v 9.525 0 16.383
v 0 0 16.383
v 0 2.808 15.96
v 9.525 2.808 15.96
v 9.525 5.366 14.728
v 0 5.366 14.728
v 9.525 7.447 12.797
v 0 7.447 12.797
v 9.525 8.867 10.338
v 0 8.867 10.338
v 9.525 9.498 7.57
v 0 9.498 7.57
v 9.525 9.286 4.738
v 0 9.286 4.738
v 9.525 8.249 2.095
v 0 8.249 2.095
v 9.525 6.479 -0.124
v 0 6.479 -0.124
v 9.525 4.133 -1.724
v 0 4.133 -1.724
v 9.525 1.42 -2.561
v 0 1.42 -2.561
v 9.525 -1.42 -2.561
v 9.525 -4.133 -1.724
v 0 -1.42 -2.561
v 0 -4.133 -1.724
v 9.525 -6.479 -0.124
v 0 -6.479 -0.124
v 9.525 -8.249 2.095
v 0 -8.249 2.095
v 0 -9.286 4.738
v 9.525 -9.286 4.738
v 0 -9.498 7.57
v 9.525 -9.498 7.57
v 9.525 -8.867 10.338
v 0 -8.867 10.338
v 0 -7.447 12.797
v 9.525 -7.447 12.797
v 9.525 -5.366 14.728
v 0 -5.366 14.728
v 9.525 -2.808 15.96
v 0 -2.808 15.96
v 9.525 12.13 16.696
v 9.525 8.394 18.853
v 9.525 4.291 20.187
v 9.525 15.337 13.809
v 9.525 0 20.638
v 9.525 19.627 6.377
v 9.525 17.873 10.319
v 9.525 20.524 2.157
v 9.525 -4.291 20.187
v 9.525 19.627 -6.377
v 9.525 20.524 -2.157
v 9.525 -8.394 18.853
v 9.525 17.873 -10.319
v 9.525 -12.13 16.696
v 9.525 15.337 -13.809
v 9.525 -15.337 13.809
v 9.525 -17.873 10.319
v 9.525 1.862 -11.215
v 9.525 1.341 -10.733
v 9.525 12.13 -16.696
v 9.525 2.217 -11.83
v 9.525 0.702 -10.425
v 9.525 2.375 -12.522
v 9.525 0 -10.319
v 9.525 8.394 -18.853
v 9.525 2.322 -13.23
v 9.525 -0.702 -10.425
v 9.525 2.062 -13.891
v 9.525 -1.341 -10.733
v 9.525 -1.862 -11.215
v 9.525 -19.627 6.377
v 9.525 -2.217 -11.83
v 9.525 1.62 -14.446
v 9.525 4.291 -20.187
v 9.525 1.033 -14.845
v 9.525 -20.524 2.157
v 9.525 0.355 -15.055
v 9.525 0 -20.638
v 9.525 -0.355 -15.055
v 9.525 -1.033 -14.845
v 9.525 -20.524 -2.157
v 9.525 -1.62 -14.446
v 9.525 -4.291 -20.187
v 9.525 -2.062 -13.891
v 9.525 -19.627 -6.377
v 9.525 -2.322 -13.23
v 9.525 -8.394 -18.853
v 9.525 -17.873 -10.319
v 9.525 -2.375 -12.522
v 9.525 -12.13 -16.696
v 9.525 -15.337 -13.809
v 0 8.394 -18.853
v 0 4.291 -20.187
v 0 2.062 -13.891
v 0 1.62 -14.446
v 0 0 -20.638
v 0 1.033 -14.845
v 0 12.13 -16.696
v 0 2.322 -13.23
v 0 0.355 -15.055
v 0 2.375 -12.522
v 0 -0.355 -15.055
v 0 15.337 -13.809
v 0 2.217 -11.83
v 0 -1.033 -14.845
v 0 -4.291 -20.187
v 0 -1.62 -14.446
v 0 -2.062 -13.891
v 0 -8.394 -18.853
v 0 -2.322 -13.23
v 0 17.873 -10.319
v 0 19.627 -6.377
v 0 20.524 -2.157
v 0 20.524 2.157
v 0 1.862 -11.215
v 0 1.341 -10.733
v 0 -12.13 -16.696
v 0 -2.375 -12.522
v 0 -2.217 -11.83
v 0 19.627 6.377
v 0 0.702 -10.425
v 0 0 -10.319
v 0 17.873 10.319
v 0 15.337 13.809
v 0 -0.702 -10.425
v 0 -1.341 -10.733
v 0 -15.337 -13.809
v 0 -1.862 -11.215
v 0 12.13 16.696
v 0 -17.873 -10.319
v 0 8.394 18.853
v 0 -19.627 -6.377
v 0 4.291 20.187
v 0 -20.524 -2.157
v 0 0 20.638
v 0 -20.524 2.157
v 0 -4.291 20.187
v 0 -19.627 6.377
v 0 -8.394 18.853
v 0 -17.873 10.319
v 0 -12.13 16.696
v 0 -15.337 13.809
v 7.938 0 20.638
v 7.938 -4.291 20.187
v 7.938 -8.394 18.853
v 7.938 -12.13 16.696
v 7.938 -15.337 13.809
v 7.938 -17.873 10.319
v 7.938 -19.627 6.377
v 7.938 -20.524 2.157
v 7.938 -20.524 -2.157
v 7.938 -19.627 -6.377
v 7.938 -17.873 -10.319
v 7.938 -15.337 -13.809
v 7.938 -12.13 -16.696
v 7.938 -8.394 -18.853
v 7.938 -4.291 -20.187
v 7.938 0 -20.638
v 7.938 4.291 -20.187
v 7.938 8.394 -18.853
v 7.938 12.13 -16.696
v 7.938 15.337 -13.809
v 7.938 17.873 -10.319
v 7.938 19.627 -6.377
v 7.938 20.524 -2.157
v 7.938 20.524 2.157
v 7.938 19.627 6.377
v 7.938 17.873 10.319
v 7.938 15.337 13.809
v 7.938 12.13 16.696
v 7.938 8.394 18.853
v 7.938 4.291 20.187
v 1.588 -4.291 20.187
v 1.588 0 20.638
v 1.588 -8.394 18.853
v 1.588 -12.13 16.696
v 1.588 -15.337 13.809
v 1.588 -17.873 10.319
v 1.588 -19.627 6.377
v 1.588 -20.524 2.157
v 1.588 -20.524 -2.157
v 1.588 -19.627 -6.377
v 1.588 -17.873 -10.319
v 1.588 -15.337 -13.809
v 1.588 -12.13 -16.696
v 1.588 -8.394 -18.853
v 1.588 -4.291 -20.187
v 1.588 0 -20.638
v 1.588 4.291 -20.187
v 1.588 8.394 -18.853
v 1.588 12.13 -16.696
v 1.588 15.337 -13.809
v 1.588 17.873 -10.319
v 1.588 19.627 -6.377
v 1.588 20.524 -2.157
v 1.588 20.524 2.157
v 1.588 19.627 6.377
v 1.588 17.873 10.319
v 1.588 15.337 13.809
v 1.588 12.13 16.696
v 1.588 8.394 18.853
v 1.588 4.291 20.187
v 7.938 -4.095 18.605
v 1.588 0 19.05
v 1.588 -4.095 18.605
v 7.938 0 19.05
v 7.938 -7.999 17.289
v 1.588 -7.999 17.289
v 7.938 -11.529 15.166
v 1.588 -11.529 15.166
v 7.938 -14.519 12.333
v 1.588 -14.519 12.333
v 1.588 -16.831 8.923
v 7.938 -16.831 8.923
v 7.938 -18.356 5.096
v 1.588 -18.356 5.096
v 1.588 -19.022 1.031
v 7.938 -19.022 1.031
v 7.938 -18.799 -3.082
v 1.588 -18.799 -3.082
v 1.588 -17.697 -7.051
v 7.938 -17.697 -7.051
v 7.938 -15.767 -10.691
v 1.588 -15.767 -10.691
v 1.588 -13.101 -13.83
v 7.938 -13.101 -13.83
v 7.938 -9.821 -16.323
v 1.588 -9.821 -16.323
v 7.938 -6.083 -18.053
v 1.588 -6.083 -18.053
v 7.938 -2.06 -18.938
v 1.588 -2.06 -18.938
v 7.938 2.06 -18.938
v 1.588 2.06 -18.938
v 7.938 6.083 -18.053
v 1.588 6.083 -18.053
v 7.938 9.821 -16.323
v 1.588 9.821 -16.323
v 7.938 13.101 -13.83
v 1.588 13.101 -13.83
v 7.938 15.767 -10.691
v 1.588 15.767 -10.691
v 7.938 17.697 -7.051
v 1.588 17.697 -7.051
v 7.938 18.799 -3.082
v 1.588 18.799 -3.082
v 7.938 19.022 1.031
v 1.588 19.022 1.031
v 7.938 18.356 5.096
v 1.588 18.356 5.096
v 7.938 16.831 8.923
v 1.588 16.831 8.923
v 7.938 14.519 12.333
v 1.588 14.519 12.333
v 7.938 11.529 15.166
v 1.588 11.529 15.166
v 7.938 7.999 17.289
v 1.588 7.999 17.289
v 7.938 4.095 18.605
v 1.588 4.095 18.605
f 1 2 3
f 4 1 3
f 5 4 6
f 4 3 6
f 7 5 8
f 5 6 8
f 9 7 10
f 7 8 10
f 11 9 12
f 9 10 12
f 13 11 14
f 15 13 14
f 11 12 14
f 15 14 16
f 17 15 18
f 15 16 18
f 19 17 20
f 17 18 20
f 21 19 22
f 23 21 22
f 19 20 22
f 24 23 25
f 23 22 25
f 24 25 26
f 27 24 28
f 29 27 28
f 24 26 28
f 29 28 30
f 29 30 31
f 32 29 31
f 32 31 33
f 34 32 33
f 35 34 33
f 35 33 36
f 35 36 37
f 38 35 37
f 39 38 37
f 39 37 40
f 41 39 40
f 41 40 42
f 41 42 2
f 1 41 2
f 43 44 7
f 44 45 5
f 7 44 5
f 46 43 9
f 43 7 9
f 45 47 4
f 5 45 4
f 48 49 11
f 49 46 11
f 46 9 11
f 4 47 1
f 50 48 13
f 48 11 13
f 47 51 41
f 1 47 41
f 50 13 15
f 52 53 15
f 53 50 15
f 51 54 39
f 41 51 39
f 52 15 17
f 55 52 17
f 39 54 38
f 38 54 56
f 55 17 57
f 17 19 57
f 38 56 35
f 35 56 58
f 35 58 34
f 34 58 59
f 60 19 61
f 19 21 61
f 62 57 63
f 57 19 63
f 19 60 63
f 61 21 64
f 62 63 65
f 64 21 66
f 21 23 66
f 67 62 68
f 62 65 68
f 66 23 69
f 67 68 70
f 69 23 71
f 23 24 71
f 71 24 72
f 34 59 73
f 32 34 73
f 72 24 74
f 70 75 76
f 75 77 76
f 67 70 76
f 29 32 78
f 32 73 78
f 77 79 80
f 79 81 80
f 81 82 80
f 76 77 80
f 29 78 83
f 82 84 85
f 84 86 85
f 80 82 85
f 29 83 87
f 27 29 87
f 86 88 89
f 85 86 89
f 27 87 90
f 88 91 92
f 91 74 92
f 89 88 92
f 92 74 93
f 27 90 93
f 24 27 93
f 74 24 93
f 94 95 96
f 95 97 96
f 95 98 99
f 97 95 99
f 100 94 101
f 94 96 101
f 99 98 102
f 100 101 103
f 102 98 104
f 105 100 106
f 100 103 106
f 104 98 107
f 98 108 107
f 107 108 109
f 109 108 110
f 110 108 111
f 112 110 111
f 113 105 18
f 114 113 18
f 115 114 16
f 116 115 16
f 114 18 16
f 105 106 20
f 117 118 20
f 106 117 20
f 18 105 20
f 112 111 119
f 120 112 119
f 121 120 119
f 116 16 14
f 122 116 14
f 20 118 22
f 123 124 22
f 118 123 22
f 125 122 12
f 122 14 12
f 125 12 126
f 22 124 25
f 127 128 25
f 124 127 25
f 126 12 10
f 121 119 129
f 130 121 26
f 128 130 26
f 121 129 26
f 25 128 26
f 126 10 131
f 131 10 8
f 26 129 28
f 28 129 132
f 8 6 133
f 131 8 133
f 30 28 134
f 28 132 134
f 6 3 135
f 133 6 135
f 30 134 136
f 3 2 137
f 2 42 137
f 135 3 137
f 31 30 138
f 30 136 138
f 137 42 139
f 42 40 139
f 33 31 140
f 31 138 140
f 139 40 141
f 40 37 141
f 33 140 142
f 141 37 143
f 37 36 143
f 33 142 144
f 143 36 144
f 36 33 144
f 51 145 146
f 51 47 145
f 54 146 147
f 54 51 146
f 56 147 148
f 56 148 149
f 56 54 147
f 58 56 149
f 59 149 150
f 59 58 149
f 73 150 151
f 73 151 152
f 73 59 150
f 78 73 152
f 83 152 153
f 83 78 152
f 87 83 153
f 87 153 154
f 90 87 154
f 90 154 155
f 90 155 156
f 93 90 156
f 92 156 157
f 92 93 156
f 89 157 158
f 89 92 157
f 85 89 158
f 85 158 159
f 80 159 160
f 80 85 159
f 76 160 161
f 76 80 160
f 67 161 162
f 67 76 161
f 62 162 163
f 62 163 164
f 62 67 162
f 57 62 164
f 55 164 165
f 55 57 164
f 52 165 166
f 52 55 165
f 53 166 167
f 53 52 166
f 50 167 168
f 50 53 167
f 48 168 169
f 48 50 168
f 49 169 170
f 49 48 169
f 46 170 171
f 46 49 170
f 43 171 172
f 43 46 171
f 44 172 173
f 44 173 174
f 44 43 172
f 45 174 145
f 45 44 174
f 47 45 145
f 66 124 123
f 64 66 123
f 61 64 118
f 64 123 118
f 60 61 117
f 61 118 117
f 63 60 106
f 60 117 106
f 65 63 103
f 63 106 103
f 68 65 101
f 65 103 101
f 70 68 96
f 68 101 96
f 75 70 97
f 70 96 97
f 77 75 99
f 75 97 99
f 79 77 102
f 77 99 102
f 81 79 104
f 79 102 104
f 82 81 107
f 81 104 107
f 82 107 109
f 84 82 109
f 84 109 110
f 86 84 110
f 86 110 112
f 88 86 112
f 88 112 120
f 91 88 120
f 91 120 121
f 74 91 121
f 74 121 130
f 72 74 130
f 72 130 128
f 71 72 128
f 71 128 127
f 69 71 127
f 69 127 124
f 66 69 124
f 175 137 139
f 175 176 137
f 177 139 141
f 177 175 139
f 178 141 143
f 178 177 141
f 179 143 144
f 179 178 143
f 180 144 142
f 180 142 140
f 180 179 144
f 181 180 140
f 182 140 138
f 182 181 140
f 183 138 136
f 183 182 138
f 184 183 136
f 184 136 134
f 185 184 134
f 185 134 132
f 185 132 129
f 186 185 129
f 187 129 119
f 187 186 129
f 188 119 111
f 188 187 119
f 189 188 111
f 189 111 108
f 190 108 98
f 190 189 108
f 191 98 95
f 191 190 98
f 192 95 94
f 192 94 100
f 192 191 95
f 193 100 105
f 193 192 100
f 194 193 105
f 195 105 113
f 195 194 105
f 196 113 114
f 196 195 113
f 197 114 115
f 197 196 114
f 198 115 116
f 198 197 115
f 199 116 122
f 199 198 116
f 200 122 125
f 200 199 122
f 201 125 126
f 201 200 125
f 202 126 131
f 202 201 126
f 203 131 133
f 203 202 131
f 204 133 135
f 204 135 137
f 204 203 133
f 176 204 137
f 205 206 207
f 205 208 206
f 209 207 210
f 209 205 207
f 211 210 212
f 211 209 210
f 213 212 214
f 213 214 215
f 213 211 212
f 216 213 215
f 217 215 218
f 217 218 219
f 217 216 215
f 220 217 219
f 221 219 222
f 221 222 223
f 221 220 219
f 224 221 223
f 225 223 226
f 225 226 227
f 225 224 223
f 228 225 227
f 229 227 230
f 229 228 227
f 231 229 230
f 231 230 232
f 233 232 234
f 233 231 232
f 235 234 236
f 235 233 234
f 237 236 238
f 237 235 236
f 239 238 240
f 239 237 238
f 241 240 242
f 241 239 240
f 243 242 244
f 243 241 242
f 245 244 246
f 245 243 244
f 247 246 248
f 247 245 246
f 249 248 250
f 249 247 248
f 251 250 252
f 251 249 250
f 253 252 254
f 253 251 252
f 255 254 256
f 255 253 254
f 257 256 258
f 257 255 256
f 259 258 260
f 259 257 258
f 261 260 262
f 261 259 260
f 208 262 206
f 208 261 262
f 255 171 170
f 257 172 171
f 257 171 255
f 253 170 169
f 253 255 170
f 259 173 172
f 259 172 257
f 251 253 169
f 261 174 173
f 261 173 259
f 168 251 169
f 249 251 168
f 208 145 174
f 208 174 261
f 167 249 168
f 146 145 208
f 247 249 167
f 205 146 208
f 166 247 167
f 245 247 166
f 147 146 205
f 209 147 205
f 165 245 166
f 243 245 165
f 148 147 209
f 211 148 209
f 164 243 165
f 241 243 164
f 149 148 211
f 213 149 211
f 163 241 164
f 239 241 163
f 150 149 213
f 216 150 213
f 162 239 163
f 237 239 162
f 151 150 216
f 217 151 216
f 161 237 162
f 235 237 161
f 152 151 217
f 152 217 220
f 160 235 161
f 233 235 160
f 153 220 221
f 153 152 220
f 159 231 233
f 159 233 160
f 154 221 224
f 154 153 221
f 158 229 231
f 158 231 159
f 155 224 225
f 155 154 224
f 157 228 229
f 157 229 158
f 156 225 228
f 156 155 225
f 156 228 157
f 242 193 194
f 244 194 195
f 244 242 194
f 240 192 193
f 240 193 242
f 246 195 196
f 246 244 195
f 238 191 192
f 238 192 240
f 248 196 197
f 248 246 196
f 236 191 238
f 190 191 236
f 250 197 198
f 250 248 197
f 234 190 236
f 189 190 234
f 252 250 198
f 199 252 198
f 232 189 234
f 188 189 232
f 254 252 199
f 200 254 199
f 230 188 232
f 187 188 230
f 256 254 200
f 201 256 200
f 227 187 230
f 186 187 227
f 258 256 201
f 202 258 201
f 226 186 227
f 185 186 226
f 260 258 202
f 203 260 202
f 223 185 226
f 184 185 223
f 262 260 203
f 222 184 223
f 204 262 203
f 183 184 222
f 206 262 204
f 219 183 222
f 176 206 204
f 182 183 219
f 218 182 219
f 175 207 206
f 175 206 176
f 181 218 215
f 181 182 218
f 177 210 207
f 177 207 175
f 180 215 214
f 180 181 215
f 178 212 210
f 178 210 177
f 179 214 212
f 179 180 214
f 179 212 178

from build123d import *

# Parameters (mm, degrees)
SKETCH3_R          = 2.38125
SKETCH3_R_2        = 9.525
CUT_EXTRUDE1_DEPTH = 31.700788874


with BuildPart() as part:
    # Sketch2 → Revolve1 (revolve)
    with BuildSketch(Plane.XY, mode=Mode.PRIVATE) as revolve1_sk:
        Polygon((0, 0), (0, 19.05), (0, 20.6375), (1.5875, 20.6375), (1.5875, 19.05), (7.9375, 19.05), (7.9375, 20.6375), (9.525, 20.6375), (9.525, 19.05), (9.525, 0), align=None)
    revolve(revolve1_sk.sketch.rotate(Axis((0, 0, 0), (1, 0, 0)), 90), axis=Axis((0, 0, 0), (1, 0, 0)))

    # Sketch3 → Cut-Extrude1 (cut, through all)
    with BuildSketch(Plane.ZY):
        with Locations((-12.7, 0)):
            Circle(SKETCH3_R)
        with Locations((6.858, 0)):
            Circle(SKETCH3_R_2)
    extrude(amount=-CUT_EXTRUDE1_DEPTH, mode=Mode.SUBTRACT)


solid = part.part
